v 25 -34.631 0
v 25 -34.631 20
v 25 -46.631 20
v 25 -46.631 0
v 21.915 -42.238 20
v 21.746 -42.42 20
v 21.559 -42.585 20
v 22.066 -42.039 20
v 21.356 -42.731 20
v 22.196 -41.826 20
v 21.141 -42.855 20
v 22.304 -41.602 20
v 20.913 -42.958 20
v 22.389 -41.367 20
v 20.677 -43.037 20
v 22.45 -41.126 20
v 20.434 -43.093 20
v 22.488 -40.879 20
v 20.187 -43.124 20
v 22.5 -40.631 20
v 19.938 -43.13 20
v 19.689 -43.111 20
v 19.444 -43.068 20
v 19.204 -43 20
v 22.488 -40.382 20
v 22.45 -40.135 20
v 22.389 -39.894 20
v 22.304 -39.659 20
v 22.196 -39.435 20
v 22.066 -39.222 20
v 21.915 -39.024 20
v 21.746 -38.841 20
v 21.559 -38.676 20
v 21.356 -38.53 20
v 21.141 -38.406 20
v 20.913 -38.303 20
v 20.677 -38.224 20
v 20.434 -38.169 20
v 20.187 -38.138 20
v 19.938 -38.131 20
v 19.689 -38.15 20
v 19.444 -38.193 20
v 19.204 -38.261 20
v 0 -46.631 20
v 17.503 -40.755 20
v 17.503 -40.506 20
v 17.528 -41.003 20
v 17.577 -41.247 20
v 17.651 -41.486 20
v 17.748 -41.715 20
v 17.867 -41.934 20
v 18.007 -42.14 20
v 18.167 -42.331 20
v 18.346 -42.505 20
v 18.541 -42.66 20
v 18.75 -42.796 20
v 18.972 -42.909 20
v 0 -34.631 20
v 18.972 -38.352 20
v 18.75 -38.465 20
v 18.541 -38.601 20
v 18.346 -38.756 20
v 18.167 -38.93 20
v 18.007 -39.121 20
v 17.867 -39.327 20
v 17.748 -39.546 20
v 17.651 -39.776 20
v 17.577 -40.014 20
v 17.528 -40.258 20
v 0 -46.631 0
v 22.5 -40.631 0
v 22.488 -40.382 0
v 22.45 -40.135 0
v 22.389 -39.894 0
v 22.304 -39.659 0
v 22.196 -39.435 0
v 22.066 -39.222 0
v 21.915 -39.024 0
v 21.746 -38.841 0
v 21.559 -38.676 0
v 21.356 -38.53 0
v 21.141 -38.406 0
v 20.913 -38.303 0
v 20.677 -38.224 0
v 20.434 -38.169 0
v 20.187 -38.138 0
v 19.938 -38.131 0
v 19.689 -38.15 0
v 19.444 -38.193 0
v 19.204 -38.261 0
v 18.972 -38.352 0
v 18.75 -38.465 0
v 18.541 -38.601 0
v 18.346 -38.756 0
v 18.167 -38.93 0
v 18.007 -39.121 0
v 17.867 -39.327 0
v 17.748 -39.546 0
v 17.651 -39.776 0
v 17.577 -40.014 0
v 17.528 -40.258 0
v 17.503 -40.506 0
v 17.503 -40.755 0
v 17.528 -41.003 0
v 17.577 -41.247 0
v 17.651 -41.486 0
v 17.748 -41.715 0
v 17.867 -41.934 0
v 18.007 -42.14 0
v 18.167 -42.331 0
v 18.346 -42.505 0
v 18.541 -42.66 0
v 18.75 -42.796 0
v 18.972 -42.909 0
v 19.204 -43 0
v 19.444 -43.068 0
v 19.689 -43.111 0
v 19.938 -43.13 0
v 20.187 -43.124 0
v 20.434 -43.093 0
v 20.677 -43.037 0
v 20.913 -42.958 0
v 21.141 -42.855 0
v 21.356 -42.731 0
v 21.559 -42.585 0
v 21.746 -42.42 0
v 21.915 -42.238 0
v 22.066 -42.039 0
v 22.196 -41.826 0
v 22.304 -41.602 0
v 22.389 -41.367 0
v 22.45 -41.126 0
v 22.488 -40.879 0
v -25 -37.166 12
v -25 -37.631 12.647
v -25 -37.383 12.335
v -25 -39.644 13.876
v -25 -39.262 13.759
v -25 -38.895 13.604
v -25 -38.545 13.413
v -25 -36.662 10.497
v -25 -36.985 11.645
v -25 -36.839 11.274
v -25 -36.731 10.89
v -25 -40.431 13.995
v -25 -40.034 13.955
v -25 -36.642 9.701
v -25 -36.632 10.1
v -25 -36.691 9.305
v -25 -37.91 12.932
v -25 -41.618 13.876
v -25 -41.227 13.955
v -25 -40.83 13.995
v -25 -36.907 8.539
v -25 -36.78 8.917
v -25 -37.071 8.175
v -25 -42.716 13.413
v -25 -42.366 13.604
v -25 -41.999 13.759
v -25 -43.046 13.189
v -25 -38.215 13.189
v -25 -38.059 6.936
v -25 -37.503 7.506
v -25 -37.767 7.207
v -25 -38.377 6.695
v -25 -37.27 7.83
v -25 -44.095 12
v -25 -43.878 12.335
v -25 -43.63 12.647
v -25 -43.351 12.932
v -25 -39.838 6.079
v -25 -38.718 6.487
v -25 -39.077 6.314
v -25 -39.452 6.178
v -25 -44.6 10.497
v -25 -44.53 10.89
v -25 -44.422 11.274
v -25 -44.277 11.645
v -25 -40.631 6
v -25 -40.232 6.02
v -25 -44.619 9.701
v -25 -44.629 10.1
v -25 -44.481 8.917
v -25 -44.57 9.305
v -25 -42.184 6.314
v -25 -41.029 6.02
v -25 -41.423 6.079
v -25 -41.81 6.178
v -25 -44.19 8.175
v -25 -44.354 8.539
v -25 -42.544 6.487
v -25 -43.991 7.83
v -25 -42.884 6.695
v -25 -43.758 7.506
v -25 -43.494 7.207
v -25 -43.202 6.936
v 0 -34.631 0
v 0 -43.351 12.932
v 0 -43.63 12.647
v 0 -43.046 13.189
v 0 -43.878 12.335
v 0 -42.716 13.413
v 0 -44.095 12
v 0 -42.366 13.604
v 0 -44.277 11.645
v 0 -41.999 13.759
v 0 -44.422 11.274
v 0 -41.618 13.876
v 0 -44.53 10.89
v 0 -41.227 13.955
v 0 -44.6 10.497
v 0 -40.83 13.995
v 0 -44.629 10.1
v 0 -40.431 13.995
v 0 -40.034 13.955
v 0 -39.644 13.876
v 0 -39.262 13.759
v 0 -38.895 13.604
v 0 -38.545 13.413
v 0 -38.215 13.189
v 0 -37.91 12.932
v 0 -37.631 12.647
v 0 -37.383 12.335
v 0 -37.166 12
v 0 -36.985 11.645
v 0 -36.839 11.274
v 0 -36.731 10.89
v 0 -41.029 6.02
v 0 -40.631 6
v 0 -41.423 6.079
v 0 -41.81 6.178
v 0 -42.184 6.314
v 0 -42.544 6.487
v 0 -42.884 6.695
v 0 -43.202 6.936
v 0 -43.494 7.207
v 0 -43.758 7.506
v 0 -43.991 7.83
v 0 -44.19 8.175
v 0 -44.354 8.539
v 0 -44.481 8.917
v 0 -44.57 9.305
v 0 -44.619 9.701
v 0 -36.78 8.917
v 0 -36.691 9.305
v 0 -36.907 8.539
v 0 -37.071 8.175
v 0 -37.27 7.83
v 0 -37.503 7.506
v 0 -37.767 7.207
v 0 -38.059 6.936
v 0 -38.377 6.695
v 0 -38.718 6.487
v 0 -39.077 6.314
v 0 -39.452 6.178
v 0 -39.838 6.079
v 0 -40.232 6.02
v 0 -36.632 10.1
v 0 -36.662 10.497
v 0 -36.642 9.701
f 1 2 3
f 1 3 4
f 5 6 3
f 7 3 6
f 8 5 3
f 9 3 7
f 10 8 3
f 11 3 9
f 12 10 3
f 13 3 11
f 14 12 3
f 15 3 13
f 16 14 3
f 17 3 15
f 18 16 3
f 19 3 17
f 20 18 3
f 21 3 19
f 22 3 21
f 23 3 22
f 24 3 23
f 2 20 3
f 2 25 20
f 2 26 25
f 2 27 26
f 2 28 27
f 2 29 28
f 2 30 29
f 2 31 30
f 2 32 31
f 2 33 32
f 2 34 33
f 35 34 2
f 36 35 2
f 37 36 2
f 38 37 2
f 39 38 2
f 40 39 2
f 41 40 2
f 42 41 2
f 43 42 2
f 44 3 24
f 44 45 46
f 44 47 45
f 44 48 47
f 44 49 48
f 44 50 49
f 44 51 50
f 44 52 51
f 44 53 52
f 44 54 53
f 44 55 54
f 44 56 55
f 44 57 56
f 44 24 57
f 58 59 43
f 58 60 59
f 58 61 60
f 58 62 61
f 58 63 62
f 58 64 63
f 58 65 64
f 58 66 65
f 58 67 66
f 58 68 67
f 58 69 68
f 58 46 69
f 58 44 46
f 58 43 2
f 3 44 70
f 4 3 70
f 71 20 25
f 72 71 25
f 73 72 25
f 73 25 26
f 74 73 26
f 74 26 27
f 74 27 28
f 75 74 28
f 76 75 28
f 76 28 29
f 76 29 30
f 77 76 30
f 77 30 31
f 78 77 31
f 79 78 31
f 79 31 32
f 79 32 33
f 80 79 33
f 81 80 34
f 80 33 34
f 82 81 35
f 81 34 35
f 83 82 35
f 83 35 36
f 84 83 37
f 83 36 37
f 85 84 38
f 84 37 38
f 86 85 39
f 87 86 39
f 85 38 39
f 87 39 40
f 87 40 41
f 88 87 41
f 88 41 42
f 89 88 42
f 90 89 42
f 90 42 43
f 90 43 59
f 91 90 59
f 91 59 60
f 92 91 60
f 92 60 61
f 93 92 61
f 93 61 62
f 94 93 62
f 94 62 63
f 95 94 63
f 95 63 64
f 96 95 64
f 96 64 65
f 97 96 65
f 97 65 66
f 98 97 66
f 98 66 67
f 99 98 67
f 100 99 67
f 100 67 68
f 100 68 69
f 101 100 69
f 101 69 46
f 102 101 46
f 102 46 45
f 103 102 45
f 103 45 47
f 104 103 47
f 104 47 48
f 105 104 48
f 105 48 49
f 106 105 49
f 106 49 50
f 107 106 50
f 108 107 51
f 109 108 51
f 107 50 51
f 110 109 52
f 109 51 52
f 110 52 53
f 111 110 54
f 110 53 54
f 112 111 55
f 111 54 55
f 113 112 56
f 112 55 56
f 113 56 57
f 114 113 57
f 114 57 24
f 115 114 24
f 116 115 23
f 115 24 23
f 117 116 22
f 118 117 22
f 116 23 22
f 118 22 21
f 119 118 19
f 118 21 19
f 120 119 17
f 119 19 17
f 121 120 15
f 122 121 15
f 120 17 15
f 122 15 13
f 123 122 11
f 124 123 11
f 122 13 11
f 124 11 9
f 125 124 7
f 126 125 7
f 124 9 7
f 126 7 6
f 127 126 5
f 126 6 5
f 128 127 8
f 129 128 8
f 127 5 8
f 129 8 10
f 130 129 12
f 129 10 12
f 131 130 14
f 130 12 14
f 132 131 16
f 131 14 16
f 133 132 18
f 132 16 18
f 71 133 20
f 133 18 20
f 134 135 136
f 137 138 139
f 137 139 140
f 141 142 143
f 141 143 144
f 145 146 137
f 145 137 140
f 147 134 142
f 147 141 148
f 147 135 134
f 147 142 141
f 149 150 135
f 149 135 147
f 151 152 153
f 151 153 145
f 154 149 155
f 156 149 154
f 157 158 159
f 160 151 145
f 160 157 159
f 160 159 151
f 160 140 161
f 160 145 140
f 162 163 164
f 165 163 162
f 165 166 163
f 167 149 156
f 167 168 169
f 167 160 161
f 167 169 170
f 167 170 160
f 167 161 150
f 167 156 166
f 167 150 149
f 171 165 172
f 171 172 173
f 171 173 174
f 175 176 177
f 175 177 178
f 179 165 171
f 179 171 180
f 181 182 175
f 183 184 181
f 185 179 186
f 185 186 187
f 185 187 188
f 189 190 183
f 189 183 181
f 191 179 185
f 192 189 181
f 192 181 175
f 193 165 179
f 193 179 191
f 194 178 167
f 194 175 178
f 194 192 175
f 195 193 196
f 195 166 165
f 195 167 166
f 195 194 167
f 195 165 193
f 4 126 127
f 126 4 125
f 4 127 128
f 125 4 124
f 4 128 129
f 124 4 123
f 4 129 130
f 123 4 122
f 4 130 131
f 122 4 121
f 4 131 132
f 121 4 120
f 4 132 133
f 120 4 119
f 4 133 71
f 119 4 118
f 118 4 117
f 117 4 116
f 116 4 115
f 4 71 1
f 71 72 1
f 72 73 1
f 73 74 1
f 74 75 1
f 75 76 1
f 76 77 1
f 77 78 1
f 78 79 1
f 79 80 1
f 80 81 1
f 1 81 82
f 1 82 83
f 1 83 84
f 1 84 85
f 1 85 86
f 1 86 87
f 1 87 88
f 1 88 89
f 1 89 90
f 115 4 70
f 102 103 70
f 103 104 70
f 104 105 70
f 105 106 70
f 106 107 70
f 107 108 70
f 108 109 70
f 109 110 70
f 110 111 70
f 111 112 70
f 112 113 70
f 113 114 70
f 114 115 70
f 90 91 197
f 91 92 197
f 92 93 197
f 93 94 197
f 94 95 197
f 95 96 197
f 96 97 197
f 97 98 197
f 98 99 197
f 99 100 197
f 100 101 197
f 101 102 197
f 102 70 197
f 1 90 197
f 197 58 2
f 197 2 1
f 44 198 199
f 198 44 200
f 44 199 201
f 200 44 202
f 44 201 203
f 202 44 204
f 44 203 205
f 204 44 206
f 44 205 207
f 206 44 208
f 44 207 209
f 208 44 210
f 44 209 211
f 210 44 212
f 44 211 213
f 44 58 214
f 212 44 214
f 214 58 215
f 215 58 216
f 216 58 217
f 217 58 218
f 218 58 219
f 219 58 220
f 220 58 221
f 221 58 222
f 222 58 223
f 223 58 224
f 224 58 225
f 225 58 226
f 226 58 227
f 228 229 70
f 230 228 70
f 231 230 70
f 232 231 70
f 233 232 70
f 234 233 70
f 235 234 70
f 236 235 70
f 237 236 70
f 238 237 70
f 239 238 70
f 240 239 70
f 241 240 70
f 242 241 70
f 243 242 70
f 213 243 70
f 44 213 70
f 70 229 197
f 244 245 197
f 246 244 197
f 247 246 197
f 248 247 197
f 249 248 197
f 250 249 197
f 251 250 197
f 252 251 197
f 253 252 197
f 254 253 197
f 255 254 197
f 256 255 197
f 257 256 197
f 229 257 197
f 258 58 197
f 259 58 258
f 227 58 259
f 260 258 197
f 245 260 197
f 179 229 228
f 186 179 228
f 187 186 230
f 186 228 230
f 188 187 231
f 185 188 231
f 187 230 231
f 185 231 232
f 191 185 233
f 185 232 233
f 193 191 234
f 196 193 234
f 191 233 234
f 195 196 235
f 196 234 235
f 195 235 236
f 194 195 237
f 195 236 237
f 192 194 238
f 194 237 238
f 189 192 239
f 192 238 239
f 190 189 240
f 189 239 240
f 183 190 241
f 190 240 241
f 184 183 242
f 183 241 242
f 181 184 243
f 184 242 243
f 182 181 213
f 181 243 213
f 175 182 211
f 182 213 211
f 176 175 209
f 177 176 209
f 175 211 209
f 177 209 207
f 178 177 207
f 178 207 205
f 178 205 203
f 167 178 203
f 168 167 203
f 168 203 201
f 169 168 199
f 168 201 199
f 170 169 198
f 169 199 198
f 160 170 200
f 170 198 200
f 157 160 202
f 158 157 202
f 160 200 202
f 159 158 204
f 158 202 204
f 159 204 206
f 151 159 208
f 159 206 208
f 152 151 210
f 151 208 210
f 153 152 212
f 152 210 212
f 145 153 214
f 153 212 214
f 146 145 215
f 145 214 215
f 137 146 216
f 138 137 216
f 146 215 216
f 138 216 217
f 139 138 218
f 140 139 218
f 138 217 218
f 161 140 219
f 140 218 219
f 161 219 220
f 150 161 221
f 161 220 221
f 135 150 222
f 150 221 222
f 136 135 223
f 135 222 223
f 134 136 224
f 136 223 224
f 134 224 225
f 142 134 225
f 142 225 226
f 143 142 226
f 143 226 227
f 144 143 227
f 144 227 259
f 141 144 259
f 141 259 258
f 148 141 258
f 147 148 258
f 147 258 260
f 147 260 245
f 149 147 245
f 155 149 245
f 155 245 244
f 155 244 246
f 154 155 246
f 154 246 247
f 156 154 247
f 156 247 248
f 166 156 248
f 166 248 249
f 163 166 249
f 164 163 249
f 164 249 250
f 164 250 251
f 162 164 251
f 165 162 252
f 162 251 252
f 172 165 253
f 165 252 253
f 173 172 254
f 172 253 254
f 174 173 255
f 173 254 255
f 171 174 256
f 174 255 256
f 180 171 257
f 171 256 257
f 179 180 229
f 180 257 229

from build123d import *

# Parameters (mm, degrees)
SKETCH_1_W          = 20
SKETCH_1_H          = 12
EXTRUDE_1_DEPTH     = 25
SKETCH_5_R          = 2.5
CUT_EXTRUDE_2_DEPTH = 57.563315968
SKETCH1_R           = 4
BOSS_EXTRUDE1_DEPTH = 25


with BuildPart() as part:
    # Эскиз1 → Вытянуть1 (new body)
    with BuildSketch(Plane(origin=(0, 0, 0), x_dir=(0, 0, -1), z_dir=(1, 0, 0))):
        with Locations((-10, -40.630555576)):
            Rectangle(SKETCH_1_W, SKETCH_1_H)
    extrude(amount=EXTRUDE_1_DEPTH)

    # Эскиз5 → Вырез-Вытянуть2 (cut, through all)
    with BuildSketch(Plane.XY.offset(20)):
        with Locations((20, -40.630555576)):
            Circle(SKETCH_5_R)
    extrude(amount=-CUT_EXTRUDE_2_DEPTH, mode=Mode.SUBTRACT)

    # Sketch1 → Boss-Extrude1 (add)
    with BuildSketch(Plane.ZY):
        with Locations(Location((10, -40.630555576, 0), (0, 0, 180))):
            Circle(SKETCH1_R)
    extrude(amount=BOSS_EXTRUDE1_DEPTH)


solid = part.part
